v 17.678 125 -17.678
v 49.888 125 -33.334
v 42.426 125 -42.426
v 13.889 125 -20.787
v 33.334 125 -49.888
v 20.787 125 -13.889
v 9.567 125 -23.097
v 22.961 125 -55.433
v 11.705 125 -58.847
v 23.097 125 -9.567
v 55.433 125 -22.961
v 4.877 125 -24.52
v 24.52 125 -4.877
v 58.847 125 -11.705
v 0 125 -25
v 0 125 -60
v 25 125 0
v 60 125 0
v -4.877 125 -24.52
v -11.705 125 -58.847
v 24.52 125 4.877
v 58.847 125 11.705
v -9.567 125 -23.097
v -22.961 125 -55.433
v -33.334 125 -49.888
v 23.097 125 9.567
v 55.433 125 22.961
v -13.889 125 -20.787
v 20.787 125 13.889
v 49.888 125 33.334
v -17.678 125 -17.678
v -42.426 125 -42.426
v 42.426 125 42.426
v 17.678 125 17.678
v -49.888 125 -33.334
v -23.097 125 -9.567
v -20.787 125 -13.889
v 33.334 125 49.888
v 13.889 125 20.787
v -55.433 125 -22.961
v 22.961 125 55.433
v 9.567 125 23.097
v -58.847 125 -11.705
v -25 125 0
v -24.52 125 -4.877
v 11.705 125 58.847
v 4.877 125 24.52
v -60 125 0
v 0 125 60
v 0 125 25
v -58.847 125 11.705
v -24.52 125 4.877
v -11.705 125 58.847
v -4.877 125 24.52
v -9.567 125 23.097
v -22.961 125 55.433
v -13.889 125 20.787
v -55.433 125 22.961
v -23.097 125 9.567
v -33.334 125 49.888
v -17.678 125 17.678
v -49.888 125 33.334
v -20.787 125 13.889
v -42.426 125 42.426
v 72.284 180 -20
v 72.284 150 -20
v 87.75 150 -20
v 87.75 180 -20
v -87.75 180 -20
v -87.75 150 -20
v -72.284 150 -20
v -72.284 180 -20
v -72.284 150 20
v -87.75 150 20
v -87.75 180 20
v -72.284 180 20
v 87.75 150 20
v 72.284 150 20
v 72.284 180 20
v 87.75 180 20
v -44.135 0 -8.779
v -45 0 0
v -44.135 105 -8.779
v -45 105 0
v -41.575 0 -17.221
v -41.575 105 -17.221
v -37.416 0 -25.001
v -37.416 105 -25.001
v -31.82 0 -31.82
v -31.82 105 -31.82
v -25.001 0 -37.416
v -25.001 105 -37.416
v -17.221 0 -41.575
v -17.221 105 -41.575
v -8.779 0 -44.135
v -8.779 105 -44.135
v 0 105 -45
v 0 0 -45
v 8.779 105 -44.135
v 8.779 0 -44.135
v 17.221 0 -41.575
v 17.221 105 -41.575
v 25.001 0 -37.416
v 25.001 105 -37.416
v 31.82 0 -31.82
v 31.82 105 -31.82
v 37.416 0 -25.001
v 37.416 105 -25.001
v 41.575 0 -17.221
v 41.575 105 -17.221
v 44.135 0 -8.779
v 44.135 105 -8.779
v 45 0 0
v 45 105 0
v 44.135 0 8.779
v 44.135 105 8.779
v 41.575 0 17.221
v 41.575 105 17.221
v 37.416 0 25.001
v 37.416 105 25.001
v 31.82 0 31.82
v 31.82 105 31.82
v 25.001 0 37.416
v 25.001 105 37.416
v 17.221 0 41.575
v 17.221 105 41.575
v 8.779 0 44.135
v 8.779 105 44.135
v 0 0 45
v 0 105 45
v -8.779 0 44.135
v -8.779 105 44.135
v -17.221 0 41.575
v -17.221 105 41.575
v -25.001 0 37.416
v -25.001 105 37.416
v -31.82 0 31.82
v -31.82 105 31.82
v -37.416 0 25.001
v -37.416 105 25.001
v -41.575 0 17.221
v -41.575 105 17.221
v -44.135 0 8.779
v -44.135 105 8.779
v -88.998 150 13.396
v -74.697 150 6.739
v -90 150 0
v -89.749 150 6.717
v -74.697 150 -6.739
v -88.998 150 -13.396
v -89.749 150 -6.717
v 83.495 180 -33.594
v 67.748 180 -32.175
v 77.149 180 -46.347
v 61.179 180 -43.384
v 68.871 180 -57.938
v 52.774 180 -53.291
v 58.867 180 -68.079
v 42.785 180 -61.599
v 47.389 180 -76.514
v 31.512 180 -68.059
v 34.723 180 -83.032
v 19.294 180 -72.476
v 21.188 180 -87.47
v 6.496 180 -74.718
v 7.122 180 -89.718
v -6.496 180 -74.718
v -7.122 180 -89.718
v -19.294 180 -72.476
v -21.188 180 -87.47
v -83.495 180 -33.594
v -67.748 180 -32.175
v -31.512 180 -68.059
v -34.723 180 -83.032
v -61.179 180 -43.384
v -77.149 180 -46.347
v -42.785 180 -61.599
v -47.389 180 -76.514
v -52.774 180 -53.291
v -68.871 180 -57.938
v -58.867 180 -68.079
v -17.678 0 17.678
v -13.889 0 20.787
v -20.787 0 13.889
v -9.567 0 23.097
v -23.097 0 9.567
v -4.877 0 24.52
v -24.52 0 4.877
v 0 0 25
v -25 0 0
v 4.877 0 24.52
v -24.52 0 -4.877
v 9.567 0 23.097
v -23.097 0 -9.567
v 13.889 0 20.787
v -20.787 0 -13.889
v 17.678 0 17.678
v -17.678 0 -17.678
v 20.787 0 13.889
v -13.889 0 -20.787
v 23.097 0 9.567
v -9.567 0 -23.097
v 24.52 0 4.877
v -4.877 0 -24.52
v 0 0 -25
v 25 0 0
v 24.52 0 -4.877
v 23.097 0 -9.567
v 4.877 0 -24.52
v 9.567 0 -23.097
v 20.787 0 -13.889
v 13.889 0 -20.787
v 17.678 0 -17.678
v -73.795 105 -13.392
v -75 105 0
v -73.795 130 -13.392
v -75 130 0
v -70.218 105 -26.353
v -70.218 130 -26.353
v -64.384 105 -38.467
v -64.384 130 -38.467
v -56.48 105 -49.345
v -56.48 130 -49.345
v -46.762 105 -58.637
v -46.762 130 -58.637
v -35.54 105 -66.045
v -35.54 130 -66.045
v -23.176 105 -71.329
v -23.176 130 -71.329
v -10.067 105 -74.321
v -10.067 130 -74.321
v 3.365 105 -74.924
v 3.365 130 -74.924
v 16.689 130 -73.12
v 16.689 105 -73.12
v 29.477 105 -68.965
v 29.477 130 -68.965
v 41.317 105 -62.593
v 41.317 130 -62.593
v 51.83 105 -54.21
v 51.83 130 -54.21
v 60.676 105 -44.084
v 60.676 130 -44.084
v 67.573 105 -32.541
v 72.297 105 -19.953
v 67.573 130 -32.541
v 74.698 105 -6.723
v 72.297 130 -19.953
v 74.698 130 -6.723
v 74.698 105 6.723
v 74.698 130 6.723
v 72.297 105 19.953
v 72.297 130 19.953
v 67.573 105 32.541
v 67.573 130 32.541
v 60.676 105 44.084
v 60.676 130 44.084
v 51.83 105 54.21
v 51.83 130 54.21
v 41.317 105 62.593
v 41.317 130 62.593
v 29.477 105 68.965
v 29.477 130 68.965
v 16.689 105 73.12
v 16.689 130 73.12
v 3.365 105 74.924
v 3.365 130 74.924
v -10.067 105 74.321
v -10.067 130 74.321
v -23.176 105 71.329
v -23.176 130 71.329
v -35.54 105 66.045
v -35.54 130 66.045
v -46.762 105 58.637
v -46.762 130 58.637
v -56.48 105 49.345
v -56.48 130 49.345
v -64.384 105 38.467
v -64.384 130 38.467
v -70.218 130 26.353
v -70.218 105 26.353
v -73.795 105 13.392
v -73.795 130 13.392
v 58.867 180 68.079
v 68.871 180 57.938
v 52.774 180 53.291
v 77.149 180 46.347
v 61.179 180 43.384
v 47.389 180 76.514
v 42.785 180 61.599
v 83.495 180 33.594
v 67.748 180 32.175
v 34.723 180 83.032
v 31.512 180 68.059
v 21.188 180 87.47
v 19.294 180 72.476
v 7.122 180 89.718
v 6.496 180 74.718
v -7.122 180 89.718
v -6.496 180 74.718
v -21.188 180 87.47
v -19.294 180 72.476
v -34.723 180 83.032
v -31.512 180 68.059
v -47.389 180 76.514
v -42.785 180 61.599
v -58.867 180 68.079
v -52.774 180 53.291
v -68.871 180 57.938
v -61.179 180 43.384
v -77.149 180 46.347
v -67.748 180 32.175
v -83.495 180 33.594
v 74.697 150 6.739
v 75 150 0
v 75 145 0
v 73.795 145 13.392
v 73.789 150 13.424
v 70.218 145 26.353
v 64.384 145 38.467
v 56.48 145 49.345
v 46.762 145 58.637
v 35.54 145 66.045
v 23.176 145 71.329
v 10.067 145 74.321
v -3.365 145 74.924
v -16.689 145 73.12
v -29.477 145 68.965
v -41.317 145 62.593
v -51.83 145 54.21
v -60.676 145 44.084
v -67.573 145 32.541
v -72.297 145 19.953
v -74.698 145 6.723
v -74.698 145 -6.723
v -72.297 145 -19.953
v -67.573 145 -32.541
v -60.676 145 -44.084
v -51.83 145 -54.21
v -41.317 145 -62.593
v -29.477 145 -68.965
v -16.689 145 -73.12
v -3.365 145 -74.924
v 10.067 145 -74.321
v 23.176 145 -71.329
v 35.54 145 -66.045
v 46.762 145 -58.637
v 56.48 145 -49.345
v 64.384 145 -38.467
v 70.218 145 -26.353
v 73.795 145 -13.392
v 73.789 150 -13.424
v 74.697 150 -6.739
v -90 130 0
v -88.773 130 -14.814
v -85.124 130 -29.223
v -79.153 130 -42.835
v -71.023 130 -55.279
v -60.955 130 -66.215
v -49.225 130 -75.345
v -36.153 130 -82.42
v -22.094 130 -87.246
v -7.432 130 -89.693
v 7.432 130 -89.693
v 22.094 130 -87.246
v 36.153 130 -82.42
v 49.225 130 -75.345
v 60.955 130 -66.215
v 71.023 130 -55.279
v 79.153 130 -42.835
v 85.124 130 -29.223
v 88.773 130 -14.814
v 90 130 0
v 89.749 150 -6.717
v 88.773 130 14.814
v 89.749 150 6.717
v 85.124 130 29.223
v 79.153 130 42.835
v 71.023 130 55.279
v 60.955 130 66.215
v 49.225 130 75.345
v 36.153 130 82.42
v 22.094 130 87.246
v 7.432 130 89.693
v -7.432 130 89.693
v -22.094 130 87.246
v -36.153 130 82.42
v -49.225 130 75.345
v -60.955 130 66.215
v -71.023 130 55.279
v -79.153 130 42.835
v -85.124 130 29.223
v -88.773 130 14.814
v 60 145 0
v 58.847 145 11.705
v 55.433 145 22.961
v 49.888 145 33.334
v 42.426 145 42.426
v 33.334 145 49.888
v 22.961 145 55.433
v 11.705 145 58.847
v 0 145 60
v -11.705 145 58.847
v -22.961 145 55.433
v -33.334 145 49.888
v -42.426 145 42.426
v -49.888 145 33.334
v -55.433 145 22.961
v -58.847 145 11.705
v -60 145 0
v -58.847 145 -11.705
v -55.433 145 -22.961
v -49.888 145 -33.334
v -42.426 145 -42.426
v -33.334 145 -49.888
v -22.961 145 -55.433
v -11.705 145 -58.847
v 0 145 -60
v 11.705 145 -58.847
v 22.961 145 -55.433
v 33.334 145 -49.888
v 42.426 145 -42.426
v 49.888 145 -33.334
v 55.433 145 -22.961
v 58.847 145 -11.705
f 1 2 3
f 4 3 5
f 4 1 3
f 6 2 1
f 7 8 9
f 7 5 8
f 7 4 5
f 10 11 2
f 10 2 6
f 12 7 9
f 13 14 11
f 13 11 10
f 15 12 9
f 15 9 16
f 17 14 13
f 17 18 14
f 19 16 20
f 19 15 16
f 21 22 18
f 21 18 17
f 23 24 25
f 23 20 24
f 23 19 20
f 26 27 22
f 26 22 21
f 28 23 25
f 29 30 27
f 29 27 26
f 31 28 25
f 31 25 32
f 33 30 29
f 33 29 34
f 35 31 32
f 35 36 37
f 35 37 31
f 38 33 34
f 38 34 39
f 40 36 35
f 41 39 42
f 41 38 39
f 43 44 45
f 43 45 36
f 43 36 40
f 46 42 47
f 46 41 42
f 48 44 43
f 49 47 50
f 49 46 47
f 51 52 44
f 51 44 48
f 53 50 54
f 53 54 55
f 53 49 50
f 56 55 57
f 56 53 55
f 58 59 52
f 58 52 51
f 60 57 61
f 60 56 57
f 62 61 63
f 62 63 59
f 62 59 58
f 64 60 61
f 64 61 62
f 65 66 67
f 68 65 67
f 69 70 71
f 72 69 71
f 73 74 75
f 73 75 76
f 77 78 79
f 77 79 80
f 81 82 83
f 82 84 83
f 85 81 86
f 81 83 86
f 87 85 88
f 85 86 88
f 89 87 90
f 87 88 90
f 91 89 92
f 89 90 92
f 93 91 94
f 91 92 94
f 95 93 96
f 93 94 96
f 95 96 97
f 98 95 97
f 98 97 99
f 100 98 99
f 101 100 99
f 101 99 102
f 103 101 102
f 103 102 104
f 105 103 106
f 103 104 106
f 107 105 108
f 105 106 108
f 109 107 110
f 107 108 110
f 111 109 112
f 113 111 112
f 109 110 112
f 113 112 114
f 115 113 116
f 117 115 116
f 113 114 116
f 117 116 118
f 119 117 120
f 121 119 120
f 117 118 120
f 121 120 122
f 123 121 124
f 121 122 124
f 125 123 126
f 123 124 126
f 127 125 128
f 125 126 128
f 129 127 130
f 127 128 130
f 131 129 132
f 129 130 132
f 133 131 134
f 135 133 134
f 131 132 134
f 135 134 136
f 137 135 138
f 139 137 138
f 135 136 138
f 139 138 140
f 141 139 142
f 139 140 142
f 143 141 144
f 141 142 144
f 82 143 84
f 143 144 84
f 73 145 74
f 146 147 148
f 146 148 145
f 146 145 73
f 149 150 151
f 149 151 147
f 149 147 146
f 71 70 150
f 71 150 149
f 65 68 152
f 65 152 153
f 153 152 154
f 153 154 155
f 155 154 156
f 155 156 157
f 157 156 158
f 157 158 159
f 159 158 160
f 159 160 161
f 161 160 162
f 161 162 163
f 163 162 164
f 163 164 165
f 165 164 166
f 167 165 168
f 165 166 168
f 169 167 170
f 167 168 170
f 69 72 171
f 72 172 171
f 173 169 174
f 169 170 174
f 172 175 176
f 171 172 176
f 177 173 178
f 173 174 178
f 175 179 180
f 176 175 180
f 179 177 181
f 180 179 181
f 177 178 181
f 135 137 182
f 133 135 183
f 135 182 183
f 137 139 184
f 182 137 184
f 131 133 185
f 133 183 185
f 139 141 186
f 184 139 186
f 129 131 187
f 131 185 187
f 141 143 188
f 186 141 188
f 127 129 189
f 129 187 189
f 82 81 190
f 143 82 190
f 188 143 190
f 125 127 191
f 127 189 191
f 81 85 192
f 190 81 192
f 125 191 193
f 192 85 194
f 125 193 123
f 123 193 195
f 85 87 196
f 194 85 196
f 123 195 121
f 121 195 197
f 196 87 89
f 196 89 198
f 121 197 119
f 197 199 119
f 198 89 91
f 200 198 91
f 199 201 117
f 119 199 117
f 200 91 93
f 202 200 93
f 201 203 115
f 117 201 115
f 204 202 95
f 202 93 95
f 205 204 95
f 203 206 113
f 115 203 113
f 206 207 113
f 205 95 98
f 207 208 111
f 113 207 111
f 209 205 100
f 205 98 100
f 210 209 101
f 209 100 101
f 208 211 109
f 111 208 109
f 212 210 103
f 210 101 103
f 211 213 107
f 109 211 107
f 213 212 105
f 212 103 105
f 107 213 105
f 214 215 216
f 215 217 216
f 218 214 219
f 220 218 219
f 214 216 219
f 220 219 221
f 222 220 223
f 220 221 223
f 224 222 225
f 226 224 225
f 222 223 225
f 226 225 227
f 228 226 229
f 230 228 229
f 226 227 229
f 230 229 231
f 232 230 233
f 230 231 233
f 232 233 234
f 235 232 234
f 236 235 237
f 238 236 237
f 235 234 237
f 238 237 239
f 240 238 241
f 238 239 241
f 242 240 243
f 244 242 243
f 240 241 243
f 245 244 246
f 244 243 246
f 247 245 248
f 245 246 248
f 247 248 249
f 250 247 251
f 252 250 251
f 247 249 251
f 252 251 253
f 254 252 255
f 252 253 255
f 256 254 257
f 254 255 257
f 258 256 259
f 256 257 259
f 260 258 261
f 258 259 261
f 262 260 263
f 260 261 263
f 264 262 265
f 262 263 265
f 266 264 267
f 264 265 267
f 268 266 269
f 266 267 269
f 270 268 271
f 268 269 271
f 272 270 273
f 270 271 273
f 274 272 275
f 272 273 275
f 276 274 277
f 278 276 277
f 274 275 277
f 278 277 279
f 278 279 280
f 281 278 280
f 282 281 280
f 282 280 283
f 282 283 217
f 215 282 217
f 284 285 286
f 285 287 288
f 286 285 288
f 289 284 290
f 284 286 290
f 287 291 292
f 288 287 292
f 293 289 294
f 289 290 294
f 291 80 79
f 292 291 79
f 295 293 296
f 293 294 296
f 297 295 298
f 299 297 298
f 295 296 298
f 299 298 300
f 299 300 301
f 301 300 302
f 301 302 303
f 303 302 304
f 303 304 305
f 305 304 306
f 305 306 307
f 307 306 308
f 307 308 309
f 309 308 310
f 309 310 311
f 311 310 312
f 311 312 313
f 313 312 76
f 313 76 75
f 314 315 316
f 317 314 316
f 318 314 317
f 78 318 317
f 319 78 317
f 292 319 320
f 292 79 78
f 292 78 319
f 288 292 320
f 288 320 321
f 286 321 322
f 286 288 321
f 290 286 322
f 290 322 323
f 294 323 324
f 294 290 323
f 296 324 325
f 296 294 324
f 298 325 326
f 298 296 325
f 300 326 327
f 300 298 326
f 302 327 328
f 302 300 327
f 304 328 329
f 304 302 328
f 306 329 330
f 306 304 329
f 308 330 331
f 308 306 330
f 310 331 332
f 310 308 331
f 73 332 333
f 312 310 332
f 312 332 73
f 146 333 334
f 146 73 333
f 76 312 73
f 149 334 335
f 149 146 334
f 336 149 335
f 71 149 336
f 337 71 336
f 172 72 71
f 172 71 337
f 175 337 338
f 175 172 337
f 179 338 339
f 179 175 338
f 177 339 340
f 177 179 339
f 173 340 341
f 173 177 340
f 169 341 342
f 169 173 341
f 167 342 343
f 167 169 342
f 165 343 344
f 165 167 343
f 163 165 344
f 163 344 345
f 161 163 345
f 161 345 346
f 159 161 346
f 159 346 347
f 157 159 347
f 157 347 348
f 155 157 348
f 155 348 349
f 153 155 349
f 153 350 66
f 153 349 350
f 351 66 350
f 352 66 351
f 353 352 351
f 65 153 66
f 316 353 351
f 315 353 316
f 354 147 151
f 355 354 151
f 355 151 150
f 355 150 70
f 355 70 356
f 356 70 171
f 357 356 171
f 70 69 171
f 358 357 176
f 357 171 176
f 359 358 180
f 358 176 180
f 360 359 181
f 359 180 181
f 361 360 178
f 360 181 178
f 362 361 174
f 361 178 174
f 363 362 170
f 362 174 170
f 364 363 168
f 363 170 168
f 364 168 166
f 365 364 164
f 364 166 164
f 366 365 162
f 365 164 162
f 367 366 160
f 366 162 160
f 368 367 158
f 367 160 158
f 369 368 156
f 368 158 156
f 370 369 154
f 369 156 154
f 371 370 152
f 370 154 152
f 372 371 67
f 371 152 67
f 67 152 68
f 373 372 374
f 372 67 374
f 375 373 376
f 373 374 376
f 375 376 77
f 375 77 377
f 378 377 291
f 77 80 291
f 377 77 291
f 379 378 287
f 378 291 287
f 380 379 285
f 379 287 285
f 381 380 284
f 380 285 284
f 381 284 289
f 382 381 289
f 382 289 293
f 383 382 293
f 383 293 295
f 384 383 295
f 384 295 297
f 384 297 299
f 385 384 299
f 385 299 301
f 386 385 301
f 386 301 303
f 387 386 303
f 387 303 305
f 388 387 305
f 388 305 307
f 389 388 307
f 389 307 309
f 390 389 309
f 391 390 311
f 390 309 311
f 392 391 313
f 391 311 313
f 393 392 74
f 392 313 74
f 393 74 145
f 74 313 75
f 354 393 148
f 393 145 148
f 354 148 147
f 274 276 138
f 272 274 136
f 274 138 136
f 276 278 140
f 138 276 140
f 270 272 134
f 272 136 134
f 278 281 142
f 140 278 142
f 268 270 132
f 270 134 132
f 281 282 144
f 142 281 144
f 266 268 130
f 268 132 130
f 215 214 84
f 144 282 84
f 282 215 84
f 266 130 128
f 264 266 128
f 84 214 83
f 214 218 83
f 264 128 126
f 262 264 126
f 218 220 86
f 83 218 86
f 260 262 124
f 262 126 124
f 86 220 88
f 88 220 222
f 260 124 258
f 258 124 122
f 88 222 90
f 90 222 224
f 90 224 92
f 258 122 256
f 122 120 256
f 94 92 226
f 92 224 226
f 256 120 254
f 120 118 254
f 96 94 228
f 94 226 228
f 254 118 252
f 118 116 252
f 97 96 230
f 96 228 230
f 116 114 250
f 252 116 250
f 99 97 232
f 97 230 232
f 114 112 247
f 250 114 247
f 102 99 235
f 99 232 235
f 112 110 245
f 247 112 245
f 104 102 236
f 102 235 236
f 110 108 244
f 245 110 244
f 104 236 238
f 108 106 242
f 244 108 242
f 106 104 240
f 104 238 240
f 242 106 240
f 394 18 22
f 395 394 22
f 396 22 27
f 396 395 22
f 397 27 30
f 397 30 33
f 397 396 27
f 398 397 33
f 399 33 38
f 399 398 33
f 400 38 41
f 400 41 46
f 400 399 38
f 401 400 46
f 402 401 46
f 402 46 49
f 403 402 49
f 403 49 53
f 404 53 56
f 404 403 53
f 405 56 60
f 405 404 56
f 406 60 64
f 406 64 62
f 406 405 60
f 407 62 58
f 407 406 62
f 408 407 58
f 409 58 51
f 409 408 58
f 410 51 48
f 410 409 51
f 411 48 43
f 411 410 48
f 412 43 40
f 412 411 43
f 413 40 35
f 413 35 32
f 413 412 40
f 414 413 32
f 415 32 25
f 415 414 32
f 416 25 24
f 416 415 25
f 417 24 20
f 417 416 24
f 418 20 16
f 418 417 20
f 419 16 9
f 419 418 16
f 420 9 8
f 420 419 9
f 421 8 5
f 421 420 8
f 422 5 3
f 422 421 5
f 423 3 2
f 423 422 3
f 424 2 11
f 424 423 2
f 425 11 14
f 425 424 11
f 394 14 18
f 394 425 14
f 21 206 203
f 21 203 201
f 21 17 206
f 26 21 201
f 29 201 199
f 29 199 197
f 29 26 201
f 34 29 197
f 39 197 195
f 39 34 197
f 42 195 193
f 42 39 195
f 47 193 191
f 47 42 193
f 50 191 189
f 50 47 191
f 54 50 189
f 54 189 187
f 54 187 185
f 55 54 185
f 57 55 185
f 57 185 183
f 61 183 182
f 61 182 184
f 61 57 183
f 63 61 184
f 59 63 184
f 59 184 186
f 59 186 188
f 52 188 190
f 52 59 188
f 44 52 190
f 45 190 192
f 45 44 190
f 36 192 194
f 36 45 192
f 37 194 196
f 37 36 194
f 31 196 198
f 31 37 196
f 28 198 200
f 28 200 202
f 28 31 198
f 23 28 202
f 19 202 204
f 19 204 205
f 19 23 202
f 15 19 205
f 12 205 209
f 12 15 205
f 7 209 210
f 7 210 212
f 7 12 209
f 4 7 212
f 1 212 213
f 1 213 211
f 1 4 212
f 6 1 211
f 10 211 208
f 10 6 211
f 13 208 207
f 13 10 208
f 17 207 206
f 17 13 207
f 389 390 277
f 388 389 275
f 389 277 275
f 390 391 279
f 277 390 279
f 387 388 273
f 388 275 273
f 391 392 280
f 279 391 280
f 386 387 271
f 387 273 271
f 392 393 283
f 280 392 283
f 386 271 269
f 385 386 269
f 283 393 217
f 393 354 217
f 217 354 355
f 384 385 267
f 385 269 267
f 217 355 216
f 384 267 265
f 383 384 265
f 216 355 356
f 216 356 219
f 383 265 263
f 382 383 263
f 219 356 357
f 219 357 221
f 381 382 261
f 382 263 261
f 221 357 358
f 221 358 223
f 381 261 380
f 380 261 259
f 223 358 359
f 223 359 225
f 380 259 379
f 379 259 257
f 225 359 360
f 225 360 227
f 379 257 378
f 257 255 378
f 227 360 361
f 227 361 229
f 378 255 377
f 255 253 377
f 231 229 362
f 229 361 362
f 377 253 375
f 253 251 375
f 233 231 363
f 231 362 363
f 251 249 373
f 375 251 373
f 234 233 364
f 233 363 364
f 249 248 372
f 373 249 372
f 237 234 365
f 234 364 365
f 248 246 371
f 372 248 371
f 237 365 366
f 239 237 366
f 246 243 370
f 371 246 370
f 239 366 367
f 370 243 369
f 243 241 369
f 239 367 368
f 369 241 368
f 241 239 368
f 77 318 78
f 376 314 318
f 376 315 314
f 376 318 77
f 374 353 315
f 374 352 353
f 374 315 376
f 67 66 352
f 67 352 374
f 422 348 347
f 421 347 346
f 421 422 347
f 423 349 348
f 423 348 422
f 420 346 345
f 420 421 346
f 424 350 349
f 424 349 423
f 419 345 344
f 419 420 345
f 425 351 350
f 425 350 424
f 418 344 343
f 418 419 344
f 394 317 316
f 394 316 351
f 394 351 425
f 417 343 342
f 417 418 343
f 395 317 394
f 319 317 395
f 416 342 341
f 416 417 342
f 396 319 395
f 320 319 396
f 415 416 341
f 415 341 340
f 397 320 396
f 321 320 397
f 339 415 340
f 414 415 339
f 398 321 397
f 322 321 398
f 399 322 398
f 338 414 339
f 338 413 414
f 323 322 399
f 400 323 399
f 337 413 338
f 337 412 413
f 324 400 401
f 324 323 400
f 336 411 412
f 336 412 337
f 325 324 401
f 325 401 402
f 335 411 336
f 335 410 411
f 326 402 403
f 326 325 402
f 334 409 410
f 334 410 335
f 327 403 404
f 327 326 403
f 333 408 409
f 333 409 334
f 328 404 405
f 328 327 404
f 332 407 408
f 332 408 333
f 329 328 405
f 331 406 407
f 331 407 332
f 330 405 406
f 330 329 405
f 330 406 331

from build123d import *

# Parameters (mm, degrees)
SKETCH3_W          = 229.663439326
SKETCH3_H          = 40
CUT_EXTRUDE1_DEPTH = 30


with BuildPart() as part:
    # Sketch1 → Revolve1 (revolve)
    with BuildSketch(Plane.XY):
        Polygon((0, 0), (-45, 0), (-45, 105), (-75, 105), (-75, 130), (-90, 130), (-90, 180), (0, 180), align=None)
    revolve(axis=Axis((0, 209.327847516, 0), (0, -1, 0)))

    # Sketch2 → Cut-Revolve3 (revolve, cut)
    with BuildSketch(Plane.XY):
        Polygon((25, 0), (25, 125), (60, 125), (60, 145), (75, 145), (75, 180), (0, 180), (0, 0), align=None)
    revolve(axis=Axis((0, 180, 0), (0, -1, 0)), mode=Mode.SUBTRACT)

    # Sketch3 → Cut-Extrude1 (cut)
    with BuildSketch(Plane(origin=(0, 180, 0), x_dir=(1, 0, 0), z_dir=(0, 1, 0))):
        Rectangle(SKETCH3_W, SKETCH3_H)
    extrude(amount=-CUT_EXTRUDE1_DEPTH, mode=Mode.SUBTRACT)


solid = part.part
